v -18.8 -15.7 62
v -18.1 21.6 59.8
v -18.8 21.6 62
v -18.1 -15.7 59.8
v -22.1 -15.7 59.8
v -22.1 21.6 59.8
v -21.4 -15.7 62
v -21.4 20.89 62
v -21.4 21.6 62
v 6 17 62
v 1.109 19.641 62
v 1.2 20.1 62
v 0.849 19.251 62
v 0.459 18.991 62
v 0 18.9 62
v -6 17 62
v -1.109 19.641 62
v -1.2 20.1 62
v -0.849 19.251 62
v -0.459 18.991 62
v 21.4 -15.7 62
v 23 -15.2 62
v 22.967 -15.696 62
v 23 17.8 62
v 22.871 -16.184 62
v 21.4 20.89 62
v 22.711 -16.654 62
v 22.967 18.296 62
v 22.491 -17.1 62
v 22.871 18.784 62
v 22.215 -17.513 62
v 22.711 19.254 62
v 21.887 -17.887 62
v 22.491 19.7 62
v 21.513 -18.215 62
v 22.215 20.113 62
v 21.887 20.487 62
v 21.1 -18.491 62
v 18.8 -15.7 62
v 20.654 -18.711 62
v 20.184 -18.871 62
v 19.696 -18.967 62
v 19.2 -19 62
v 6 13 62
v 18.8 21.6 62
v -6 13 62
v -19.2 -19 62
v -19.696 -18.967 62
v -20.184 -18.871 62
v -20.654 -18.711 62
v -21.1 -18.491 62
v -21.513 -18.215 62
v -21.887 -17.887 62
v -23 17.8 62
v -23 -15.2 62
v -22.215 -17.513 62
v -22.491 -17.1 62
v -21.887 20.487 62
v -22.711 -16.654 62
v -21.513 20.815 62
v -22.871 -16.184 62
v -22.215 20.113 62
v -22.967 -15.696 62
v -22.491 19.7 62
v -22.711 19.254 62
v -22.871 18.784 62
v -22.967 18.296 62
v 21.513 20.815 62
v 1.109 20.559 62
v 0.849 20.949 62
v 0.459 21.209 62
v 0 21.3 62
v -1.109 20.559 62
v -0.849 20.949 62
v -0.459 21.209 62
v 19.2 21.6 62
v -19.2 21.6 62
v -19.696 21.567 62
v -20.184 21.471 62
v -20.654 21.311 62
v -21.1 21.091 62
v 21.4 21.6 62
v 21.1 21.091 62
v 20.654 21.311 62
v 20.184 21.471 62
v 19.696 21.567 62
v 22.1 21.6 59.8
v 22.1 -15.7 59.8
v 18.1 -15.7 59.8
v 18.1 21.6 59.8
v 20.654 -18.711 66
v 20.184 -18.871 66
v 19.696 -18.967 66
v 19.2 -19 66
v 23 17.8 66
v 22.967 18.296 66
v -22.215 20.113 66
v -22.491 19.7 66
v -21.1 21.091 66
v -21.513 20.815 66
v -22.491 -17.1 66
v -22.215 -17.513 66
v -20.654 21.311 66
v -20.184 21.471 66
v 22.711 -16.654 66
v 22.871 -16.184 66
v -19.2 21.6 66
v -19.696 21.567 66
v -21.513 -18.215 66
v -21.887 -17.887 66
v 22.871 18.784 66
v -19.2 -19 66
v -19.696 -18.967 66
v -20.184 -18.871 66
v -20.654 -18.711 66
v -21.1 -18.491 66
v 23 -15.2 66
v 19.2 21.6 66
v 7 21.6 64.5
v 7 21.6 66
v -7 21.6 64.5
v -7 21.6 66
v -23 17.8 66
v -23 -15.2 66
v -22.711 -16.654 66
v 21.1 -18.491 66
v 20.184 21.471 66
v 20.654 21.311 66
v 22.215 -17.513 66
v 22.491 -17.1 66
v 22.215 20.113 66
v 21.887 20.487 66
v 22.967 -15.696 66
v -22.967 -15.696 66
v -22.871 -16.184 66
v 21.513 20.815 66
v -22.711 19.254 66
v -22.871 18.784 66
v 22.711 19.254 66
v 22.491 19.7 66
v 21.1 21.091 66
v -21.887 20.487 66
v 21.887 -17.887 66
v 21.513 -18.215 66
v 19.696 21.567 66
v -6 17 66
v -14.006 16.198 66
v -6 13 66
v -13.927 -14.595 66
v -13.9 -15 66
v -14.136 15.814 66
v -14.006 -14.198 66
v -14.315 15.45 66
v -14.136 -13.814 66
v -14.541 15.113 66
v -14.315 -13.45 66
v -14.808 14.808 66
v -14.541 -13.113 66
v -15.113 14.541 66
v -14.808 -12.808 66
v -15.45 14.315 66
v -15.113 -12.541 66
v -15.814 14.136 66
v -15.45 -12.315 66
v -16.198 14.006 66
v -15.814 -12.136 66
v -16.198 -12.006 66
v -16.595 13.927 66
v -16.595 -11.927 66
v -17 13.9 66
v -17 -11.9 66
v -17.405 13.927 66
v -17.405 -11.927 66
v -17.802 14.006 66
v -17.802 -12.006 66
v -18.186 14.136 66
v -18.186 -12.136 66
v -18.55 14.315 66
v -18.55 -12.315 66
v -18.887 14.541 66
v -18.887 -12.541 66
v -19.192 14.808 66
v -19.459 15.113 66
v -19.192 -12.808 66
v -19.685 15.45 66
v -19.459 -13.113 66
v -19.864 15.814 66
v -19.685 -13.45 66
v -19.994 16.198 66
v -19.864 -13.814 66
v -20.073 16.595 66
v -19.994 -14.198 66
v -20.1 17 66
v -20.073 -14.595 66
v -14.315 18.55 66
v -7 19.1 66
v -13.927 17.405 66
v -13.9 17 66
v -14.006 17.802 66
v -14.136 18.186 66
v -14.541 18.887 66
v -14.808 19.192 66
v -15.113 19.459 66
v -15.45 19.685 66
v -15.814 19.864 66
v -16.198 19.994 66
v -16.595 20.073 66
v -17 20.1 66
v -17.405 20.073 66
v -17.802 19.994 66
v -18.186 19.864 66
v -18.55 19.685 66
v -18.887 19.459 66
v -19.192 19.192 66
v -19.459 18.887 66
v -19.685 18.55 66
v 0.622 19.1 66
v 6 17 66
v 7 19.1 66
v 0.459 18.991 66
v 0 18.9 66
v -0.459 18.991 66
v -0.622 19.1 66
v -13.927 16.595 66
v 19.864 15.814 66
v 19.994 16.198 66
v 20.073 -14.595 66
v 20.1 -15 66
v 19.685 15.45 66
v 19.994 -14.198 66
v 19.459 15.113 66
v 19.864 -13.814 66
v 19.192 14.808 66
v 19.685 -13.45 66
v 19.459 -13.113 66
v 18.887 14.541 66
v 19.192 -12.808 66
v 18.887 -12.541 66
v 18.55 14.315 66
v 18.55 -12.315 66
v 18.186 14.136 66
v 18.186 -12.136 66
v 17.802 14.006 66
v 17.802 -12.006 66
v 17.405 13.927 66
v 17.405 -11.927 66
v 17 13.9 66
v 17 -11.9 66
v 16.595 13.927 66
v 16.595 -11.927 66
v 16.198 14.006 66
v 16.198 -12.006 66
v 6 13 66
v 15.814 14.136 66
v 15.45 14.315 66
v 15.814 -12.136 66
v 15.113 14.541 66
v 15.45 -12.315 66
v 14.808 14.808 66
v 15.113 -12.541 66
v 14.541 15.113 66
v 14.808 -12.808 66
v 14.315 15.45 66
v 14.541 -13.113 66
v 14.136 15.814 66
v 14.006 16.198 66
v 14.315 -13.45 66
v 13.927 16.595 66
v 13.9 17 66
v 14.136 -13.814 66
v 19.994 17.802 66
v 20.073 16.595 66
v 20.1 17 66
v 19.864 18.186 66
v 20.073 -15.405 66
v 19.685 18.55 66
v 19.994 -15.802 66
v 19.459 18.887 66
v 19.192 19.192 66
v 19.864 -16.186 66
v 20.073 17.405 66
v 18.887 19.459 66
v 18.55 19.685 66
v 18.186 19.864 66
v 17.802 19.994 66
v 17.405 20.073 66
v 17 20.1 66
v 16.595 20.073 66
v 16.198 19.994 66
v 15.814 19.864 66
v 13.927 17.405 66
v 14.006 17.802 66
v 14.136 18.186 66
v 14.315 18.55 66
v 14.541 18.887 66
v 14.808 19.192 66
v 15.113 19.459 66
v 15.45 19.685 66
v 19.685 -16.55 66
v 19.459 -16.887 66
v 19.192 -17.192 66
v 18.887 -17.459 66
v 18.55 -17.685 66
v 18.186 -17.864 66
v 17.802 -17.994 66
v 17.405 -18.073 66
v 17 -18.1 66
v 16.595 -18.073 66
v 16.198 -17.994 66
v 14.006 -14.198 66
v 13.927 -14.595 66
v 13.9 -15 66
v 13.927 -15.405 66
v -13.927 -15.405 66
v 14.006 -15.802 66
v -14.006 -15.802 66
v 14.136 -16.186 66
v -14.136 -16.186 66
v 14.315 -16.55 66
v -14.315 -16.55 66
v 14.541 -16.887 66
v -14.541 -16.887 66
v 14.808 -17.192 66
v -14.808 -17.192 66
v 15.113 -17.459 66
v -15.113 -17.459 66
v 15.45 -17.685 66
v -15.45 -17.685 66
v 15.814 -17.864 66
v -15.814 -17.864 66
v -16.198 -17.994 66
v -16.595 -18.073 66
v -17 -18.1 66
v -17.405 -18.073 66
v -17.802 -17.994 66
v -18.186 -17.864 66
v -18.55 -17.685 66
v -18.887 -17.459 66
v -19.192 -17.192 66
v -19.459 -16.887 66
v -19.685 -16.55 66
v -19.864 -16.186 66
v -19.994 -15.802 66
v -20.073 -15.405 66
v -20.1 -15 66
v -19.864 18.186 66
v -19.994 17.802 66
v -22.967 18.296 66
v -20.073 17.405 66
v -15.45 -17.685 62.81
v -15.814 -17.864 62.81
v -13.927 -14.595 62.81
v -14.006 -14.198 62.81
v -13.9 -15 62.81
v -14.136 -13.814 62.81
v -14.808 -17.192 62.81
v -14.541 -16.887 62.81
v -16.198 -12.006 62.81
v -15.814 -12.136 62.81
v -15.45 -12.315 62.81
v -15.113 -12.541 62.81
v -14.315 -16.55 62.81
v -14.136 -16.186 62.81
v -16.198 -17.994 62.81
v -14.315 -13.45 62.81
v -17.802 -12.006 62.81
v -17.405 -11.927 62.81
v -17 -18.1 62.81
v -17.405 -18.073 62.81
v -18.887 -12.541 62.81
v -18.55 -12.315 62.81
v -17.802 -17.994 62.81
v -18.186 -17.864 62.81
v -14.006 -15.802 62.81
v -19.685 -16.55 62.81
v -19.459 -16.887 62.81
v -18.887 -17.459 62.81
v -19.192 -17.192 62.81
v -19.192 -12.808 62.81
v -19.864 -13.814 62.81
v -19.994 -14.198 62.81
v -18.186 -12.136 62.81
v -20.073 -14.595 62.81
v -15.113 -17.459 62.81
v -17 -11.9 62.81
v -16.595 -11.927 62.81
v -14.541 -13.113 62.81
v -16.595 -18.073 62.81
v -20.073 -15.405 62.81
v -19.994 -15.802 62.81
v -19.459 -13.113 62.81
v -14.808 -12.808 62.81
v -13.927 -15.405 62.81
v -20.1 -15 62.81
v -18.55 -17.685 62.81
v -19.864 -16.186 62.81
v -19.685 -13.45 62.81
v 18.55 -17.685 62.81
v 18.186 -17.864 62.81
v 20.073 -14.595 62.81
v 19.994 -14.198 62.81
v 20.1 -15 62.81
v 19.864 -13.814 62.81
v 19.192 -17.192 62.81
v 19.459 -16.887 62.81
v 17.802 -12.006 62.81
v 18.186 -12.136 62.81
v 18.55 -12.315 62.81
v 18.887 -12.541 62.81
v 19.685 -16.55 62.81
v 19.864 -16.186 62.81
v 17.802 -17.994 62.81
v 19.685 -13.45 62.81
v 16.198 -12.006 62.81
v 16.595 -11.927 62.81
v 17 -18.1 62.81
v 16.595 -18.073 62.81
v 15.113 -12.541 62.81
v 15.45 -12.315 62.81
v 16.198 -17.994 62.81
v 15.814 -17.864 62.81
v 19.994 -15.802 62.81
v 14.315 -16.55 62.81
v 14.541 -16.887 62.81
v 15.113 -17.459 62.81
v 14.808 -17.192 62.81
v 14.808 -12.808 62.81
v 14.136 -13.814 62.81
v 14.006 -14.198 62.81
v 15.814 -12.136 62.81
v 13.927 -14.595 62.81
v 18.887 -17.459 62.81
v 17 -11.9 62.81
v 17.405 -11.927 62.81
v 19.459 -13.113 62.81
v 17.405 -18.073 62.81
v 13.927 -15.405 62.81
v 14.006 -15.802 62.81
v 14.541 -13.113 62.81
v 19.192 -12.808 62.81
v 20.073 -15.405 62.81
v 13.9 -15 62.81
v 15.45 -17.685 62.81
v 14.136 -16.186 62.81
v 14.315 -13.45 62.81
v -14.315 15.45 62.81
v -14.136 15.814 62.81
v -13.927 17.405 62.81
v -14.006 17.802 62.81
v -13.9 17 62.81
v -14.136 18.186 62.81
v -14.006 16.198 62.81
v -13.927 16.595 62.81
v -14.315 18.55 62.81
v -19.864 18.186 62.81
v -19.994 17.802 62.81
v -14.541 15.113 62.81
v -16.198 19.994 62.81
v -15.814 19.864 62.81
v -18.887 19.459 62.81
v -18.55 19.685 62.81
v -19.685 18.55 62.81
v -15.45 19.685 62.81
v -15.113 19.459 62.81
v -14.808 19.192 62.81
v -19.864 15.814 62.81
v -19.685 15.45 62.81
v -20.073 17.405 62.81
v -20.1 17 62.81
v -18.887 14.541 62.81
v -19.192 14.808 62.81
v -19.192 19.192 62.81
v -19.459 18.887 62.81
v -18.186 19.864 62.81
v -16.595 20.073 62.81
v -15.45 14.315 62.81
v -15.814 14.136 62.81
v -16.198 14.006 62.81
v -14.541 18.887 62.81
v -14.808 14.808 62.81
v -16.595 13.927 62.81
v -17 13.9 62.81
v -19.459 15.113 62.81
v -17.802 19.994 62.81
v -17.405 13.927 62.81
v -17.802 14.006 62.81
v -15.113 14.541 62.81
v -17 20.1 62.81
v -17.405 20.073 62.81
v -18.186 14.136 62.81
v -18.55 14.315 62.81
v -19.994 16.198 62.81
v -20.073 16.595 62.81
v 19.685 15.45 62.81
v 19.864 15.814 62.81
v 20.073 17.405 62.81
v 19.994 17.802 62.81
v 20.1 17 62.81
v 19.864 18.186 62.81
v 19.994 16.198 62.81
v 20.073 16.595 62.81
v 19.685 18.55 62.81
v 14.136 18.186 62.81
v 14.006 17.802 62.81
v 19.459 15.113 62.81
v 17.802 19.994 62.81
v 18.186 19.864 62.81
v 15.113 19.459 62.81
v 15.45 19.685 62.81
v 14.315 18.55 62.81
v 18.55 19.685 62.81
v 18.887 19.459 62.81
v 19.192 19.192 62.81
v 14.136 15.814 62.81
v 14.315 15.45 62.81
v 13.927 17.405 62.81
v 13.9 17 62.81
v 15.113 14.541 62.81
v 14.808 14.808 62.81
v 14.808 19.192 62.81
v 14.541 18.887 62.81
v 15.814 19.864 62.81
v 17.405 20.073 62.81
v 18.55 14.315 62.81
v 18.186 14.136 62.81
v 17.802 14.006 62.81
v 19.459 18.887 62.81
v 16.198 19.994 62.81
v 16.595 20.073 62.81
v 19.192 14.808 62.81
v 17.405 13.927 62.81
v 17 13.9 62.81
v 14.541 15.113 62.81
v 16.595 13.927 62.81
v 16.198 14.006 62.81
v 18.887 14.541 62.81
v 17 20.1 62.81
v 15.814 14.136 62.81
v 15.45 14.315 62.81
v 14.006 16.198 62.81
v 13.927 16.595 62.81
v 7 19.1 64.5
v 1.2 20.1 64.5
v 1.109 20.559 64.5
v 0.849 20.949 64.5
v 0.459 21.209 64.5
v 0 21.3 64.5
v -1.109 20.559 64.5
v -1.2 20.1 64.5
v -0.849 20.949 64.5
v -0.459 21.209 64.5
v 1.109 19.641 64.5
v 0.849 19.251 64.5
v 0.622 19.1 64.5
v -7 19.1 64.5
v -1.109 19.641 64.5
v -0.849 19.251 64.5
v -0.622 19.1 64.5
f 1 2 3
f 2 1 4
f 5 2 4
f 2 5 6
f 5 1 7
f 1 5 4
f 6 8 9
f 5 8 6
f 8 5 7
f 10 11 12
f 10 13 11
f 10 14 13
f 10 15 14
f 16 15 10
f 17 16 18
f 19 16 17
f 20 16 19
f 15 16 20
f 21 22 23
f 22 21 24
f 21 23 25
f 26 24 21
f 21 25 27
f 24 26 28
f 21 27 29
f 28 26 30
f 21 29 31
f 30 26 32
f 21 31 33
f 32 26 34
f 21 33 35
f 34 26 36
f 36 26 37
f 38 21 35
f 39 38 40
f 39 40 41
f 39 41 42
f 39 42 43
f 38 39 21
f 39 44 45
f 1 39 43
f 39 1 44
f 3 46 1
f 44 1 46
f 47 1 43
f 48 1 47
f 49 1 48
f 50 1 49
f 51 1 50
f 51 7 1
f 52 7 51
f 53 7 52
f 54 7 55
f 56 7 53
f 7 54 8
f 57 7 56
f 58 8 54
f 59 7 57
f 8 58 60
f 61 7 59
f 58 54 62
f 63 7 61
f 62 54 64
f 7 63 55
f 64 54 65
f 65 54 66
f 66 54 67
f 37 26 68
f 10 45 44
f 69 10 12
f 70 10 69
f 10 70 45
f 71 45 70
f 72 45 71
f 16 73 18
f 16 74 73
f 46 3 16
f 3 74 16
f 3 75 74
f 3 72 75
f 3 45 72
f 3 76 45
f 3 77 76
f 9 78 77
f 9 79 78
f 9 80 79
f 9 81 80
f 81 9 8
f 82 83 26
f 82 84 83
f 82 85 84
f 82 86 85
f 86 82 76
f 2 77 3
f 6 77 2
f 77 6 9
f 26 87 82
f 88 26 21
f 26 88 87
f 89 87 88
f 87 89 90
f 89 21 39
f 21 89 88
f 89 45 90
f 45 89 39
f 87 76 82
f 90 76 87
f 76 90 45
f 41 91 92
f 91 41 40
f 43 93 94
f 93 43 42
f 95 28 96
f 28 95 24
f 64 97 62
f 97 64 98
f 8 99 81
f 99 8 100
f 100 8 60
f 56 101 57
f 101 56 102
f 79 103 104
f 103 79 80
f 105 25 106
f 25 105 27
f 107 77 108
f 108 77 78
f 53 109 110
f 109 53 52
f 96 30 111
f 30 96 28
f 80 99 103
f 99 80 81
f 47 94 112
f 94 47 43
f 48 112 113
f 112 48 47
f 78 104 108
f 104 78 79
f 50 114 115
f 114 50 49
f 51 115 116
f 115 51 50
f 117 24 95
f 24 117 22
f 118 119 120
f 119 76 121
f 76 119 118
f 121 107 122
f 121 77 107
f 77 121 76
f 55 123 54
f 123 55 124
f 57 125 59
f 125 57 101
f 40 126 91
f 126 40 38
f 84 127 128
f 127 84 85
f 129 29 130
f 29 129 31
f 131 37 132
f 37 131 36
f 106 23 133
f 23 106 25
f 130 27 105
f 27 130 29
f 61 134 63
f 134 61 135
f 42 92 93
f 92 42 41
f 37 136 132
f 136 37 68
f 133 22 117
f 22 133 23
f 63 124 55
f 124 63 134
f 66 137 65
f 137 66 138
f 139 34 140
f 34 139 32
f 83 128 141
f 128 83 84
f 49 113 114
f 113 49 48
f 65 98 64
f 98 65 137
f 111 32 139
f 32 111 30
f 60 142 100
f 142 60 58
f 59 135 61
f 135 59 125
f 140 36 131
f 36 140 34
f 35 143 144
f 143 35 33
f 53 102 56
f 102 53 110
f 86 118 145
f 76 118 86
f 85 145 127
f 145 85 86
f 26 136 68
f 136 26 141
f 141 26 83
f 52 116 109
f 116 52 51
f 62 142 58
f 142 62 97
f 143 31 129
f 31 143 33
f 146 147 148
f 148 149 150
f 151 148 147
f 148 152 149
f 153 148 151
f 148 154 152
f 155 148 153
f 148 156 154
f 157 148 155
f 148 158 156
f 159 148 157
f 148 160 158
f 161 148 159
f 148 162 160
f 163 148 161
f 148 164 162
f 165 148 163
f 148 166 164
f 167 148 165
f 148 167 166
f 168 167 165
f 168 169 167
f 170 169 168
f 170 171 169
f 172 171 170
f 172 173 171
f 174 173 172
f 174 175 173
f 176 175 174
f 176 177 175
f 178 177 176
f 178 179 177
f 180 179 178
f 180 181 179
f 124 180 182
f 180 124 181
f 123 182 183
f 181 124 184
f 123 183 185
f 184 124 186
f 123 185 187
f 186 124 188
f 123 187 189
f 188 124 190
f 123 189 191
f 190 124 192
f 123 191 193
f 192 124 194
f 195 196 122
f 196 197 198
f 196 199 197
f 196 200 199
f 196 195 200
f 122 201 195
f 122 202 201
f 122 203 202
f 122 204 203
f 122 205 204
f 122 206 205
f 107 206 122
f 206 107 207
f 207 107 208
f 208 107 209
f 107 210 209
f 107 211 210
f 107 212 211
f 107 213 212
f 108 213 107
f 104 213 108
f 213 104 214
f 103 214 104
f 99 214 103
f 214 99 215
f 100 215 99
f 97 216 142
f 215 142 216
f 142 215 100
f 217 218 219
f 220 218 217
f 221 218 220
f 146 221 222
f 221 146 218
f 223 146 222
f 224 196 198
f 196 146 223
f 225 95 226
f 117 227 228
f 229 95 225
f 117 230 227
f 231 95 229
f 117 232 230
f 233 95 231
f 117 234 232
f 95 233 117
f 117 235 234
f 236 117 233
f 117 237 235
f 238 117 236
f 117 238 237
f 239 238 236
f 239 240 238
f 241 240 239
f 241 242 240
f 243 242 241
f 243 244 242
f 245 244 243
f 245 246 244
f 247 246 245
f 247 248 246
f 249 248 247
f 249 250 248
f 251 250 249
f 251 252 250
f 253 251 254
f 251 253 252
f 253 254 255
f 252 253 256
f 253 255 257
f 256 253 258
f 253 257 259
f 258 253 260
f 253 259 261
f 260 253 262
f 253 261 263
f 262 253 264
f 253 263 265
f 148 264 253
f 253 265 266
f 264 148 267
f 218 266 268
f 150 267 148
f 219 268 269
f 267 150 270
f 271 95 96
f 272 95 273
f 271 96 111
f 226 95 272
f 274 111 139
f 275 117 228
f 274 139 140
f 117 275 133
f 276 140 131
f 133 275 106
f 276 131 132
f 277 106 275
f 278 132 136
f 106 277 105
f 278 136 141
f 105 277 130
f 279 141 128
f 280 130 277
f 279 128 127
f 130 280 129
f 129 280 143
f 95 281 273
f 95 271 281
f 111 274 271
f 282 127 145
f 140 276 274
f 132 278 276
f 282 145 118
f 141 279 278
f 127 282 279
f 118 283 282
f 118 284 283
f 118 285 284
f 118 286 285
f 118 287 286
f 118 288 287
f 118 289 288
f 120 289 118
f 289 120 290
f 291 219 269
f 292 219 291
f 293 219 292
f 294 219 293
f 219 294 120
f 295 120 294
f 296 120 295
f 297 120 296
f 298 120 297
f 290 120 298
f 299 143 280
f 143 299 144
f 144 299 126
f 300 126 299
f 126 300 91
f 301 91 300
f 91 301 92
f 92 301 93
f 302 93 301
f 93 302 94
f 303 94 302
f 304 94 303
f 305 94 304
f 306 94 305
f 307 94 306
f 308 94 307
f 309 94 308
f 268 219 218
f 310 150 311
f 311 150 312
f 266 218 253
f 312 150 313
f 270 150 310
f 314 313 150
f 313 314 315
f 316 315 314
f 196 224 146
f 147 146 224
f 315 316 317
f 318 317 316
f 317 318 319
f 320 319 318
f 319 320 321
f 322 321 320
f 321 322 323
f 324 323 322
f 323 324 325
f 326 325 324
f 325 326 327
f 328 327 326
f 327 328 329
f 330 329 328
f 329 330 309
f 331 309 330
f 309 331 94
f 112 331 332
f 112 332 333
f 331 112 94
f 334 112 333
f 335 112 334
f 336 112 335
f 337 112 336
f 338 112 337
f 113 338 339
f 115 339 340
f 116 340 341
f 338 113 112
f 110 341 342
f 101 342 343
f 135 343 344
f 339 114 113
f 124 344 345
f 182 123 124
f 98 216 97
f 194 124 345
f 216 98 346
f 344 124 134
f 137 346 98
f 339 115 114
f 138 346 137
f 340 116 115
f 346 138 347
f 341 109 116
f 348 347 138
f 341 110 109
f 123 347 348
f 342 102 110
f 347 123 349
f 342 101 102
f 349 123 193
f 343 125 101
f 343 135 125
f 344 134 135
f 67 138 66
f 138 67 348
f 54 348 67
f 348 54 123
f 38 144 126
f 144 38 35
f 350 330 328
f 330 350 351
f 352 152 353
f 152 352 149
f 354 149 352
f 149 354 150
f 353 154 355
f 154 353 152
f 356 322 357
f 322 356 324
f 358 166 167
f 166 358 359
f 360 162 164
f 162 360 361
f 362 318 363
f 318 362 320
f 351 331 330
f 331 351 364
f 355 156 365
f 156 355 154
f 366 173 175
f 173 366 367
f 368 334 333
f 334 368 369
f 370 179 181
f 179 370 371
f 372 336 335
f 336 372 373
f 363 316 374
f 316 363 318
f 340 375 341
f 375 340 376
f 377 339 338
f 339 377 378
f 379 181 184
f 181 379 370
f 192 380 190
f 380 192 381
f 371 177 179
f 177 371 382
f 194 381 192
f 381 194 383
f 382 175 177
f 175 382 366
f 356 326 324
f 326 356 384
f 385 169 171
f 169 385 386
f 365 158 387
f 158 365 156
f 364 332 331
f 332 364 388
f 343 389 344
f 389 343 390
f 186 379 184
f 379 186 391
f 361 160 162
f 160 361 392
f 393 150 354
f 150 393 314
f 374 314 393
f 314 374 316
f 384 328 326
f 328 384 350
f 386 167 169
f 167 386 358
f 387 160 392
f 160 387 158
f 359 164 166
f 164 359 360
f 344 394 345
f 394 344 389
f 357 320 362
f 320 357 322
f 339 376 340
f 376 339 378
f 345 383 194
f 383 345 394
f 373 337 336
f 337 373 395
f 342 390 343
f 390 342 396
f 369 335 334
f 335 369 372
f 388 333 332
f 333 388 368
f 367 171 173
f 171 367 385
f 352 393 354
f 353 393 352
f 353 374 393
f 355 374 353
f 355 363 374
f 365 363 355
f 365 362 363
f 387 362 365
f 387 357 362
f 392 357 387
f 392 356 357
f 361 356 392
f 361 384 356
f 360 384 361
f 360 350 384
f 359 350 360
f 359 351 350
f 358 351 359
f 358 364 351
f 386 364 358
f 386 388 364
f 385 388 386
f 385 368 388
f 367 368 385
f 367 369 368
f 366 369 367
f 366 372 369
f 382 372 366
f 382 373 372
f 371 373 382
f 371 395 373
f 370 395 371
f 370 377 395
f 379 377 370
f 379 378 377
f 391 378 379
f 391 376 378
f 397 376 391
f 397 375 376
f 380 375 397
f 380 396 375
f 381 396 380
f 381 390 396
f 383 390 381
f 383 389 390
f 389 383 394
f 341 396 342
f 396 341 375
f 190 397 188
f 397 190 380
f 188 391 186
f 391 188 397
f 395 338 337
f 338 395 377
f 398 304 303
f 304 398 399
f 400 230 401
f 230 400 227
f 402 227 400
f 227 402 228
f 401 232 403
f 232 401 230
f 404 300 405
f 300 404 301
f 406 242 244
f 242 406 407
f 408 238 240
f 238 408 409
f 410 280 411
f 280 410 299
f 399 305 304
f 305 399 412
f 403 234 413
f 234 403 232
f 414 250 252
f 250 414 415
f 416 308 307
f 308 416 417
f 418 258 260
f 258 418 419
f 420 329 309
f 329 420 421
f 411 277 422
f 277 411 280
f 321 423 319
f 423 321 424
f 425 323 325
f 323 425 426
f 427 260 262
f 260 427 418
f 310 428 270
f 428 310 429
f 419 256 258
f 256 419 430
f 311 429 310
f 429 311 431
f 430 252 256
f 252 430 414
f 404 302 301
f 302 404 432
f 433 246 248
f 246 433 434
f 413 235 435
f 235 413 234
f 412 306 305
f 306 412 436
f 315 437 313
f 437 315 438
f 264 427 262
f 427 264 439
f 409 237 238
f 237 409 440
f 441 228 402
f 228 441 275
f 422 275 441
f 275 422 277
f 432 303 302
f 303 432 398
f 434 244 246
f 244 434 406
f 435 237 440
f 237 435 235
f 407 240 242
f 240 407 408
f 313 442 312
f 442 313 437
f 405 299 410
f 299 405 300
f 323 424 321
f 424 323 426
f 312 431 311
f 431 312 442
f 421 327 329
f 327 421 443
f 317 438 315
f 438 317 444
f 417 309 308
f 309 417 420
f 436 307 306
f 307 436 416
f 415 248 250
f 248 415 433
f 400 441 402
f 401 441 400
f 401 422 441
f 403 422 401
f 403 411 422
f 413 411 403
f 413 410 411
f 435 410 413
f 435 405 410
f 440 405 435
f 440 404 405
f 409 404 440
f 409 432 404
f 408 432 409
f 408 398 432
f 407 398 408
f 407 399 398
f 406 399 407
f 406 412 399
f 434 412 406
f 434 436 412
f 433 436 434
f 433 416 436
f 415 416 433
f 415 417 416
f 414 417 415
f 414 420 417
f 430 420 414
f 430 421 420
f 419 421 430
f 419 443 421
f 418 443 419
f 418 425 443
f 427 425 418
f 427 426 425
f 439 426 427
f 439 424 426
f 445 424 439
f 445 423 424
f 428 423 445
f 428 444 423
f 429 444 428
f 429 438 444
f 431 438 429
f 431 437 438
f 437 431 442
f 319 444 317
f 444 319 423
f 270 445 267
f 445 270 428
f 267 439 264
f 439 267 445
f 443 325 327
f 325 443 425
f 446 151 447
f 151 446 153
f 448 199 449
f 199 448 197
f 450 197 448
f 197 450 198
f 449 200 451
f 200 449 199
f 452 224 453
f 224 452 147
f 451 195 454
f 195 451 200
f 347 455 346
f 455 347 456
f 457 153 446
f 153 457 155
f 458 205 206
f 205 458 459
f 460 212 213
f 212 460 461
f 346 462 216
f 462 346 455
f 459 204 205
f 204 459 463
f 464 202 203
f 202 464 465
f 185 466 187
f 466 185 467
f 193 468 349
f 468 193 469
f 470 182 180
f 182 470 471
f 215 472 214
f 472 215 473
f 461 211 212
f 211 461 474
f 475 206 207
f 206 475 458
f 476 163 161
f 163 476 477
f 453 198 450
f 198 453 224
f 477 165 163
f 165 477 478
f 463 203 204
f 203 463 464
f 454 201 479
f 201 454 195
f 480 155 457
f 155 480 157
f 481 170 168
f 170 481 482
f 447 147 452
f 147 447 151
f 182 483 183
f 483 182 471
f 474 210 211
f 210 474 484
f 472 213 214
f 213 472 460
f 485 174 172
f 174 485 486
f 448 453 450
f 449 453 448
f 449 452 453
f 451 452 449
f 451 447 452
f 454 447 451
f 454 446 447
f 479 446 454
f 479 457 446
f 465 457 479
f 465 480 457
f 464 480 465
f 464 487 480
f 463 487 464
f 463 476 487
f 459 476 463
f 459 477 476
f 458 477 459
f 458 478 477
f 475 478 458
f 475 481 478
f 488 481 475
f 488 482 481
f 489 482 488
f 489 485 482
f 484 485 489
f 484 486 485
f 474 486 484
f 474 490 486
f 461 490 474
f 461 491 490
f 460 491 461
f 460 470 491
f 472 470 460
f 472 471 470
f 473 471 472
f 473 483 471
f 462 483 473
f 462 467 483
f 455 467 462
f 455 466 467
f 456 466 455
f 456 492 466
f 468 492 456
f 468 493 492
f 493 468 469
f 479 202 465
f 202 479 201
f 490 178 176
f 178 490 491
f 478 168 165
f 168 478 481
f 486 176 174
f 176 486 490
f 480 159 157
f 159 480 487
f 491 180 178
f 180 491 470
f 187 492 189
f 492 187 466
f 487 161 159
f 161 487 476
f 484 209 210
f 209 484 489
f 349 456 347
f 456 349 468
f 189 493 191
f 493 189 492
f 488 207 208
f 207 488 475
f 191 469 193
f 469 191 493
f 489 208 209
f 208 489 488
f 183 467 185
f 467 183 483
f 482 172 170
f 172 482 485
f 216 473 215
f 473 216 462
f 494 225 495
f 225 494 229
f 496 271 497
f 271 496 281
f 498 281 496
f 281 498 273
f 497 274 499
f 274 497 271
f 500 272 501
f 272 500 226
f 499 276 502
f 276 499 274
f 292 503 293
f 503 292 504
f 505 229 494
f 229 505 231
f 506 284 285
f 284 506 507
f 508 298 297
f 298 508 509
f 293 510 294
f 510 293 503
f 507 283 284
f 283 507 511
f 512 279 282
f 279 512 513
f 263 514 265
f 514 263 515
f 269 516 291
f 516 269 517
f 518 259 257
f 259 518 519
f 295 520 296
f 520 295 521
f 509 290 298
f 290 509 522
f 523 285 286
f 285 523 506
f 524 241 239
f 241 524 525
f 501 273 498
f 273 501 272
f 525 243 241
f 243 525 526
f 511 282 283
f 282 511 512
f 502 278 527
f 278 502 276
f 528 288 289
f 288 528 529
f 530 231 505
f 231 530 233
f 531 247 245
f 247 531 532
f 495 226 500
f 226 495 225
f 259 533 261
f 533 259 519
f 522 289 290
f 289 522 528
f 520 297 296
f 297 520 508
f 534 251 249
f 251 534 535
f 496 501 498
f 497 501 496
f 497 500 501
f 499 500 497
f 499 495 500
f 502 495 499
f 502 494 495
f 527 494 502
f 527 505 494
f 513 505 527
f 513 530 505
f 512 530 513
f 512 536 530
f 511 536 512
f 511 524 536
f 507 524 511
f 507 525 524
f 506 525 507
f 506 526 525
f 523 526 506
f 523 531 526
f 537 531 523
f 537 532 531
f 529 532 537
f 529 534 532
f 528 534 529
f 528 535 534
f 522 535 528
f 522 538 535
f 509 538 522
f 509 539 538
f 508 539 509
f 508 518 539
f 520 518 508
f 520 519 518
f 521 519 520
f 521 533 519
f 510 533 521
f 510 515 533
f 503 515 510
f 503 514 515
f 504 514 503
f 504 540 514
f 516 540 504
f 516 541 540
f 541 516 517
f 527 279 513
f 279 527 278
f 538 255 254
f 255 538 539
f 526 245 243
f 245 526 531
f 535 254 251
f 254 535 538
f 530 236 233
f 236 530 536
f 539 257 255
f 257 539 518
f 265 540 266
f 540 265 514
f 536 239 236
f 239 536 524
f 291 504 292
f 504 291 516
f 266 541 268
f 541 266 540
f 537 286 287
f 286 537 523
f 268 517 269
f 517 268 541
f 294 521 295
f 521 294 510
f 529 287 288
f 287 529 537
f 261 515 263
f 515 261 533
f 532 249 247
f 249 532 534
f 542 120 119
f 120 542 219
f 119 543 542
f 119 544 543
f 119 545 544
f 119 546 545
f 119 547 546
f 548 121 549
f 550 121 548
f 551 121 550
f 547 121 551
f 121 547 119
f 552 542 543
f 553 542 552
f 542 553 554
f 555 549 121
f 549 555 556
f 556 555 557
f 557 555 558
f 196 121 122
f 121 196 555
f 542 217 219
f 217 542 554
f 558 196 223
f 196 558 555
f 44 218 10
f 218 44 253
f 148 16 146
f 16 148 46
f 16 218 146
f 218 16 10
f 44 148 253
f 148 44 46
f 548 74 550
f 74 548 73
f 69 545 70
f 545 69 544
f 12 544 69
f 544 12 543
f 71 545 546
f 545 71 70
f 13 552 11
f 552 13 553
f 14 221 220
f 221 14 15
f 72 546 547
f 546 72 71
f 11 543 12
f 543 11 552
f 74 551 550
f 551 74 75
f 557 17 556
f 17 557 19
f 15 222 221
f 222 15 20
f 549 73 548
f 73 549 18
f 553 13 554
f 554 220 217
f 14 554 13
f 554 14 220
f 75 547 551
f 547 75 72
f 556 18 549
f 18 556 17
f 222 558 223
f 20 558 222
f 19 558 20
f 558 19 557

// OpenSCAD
// file: ../config.scad
// Sparky - shared parameters and the module interface spec.
// All dimensions in mm. Origin: centre of the footprint, on the table.
// +X = right, +Y = back, -Y = front (screen side), +Z = up.
//
// Values marked (measure) are estimates; measure your parts and edit here.

$fn = 48;

// ---------- Interface (keep fixed so modules stay swappable) ----------
outer_w   = 56;     // footprint width
outer_d   = 52;     // footprint depth
corner_r  = 8;      // vertical corner radius of shell, collar and base
wall      = 2;      // shell wall
clear     = 0.3;    // fit clearance between printed parts

base_h    = 12;     // battery base height (deck top)
deck_t    = 2;      // base deck thickness
collar_h  = 4;      // interface collar band
ridge_h   = 2;      // locating ridge on top of the collar
shell_z0  = base_h + collar_h;  // 16, bottom of the shell
shell_z1  = 70;     // top of the shell

// Magnets: 6 x 3 mm neodymium discs, all N faces pointing up.
mag_d     = 6.2;    // pocket diameter (magnet 6.0)
mag_h     = 3.2;    // pocket depth (magnet 3.0)
boss_d    = 9;

mag_base_rack  = [[-21,-14],[21,-14],[-21,16],[21,16]];   // base deck <-> rack floor
mag_rack_shell = [[-17,-15],[17,-15],[-17,17],[17,17]];   // crown <-> shell ceiling
mag_lid        = [[-21,-19],[21,-19],[-21,19],[21,19]];   // lid <-> base
collar_pins    = [[-25.9,0],[25.9,0],[0,-23.9],[0,23.9]];
pin_hole  = 1.95;   // locating pins: short pieces of 1.75 mm filament
pin_depth = 3;

// ---------- Inner rack ----------
rack_z0   = base_h;  // 12, sits on the base deck
rack_w    = 47.2;
rack_d    = 43.2;
rack_t    = 3;       // structural wall thickness (PLA: keep >= 3)
rack_corner_r = 3.8; // vertical corner radius (clears the collar's R4 opening)
crown_z   = 62;      // top of the rack frame = underside of the removable crown
crown_t   = 4;       // crown thickness (holds the shell magnets)
crown_top = crown_z + crown_t;   // 66

// Dovetail rails: the crown slides in from the back along the side frame tops.
rail_x       = 20.1;   // rail centre line, +/-
rail_cap_w   = 7;      // width of the rail bar on top of each side frame
rail_cap_h   = 4;
dt_depth     = 2.5;    // groove depth
dt_top_w     = 3.0;    // groove width at the opening
dt_bot_w     = 4.4;    // groove width at the bottom (the undercut)
dt_clear     = 0.2;    // per side, tongue vs groove
dt_stop_y    = -16;    // grooves are closed in front of this (front stop)
crown_lock   = true;   // optional M2 screw at the back
shelf_z   = 21;      // ESP32 shelf bottom (top = 24)

// ---------- Components (measure) ----------
oled_hole_dx = 30.4;           // 1.3" OLED mounting holes, centre to centre
oled_hole_dz = 28.4;
oled_hole_z  = 45;             // centre height of the OLED
m2_pilot     = 1.8;            // pilot hole for M2 self-tapping screws

screen_w  = 34;  screen_h = 24;  screen_z = 34;   // window in the shell
led_z     = 20;  led_d    = 5.2;
mic_y     = -7;  mic_hole = 1.2;
usb_w     = 12;  usb_h    = 7;   usb_z    = 33;
sw_x      = 13.5; sw_w    = 8;   sw_h     = 4;   sw_z = 30;
spk_slots = 5;   spk_y0   = -9;  spk_pitch = 3.5; spk_slot_w = 1.6;
spk_z0    = 24;  spk_z1   = 56;

battery   = [30, 40, 5];       // LiPo 503040 (measure)
lid_t     = 4;

// ---------- Helpers ----------
module rrect2d(w, d, r) { offset(r) square([w - 2*r, d - 2*r], center = true); }
module rrect(w, d, r, h) { linear_extrude(h) rrect2d(w, d, r); }
module rbox(w, d, h, r) {      // box with every edge rounded, z from 0 to h
  hull() for (x = [-1,1], y = [-1,1], z = [r, h - r])
    translate([x*(w/2 - r), y*(d/2 - r), z]) sphere(r);
}
module mag_pocket(z) { translate([0,0,z]) cylinder(d = mag_d, h = mag_h); }

// Dovetail profile along Y: top width at z = 0, bottom width at z = -depth.
module dovetail(w_top, w_bot, depth, y0, y1)
  translate([0, y1, 0]) rotate([90, 0, 0]) linear_extrude(y1 - y0)
    polygon([[-w_top/2, 0], [w_top/2, 0], [w_bot/2, -depth], [-w_bot/2, -depth]]);
// main file
// Crown: the removable top of the rack. Slides in from the back on two
// dovetail tongues, carries the mic + touch sensor and the 4 shell magnets.
// Pull the shell up, (remove the lock screw), slide the crown back: the whole
// inside of the rack is open from above for wiring.
include <../config.scad>

module crown() {
  w  = rack_w - 1.2;                 // 46
  y0 = -19;  y1 = rack_d/2;          // -19 .. 21.6
  tw = dt_top_w - 2*dt_clear;        // tongue width at the crown underside
  bw = dt_bot_w - 2*dt_clear;        // tongue width at its tip
  difference() {
    union() {
      translate([0, (y0 + y1)/2, crown_z]) rrect(w, y1 - y0, rack_corner_r, crown_t);
      // dovetail tongues (hang below the plate into the rack's grooves)
      for (s = [-1, 1]) translate([s*rail_x, 0, crown_z])
        dovetail(tw, bw, dt_depth - 0.3, dt_stop_y + 0.3, y1);
    }
    // finger notch at the back for sliding it out
    translate([-7, y1 - 2.5, crown_top - 1.5]) cube([14, 3, 2]);
    // wire slot for the mic and touch sensor
    translate([-6, 13, crown_z - 1]) cube([12, 4, crown_t + 2]);
    // shell magnets (pockets from the top)
    for (p = mag_rack_shell) translate([p[0], p[1], 0]) mag_pocket(crown_top - mag_h + 0.01);
    // lock screw clearance
    if (crown_lock) translate([0, rack_d/2 - rack_t/2, crown_z - 1]) cylinder(d = 2.4, h = crown_t + 3, $fn = 16);
  }
}

crown();
